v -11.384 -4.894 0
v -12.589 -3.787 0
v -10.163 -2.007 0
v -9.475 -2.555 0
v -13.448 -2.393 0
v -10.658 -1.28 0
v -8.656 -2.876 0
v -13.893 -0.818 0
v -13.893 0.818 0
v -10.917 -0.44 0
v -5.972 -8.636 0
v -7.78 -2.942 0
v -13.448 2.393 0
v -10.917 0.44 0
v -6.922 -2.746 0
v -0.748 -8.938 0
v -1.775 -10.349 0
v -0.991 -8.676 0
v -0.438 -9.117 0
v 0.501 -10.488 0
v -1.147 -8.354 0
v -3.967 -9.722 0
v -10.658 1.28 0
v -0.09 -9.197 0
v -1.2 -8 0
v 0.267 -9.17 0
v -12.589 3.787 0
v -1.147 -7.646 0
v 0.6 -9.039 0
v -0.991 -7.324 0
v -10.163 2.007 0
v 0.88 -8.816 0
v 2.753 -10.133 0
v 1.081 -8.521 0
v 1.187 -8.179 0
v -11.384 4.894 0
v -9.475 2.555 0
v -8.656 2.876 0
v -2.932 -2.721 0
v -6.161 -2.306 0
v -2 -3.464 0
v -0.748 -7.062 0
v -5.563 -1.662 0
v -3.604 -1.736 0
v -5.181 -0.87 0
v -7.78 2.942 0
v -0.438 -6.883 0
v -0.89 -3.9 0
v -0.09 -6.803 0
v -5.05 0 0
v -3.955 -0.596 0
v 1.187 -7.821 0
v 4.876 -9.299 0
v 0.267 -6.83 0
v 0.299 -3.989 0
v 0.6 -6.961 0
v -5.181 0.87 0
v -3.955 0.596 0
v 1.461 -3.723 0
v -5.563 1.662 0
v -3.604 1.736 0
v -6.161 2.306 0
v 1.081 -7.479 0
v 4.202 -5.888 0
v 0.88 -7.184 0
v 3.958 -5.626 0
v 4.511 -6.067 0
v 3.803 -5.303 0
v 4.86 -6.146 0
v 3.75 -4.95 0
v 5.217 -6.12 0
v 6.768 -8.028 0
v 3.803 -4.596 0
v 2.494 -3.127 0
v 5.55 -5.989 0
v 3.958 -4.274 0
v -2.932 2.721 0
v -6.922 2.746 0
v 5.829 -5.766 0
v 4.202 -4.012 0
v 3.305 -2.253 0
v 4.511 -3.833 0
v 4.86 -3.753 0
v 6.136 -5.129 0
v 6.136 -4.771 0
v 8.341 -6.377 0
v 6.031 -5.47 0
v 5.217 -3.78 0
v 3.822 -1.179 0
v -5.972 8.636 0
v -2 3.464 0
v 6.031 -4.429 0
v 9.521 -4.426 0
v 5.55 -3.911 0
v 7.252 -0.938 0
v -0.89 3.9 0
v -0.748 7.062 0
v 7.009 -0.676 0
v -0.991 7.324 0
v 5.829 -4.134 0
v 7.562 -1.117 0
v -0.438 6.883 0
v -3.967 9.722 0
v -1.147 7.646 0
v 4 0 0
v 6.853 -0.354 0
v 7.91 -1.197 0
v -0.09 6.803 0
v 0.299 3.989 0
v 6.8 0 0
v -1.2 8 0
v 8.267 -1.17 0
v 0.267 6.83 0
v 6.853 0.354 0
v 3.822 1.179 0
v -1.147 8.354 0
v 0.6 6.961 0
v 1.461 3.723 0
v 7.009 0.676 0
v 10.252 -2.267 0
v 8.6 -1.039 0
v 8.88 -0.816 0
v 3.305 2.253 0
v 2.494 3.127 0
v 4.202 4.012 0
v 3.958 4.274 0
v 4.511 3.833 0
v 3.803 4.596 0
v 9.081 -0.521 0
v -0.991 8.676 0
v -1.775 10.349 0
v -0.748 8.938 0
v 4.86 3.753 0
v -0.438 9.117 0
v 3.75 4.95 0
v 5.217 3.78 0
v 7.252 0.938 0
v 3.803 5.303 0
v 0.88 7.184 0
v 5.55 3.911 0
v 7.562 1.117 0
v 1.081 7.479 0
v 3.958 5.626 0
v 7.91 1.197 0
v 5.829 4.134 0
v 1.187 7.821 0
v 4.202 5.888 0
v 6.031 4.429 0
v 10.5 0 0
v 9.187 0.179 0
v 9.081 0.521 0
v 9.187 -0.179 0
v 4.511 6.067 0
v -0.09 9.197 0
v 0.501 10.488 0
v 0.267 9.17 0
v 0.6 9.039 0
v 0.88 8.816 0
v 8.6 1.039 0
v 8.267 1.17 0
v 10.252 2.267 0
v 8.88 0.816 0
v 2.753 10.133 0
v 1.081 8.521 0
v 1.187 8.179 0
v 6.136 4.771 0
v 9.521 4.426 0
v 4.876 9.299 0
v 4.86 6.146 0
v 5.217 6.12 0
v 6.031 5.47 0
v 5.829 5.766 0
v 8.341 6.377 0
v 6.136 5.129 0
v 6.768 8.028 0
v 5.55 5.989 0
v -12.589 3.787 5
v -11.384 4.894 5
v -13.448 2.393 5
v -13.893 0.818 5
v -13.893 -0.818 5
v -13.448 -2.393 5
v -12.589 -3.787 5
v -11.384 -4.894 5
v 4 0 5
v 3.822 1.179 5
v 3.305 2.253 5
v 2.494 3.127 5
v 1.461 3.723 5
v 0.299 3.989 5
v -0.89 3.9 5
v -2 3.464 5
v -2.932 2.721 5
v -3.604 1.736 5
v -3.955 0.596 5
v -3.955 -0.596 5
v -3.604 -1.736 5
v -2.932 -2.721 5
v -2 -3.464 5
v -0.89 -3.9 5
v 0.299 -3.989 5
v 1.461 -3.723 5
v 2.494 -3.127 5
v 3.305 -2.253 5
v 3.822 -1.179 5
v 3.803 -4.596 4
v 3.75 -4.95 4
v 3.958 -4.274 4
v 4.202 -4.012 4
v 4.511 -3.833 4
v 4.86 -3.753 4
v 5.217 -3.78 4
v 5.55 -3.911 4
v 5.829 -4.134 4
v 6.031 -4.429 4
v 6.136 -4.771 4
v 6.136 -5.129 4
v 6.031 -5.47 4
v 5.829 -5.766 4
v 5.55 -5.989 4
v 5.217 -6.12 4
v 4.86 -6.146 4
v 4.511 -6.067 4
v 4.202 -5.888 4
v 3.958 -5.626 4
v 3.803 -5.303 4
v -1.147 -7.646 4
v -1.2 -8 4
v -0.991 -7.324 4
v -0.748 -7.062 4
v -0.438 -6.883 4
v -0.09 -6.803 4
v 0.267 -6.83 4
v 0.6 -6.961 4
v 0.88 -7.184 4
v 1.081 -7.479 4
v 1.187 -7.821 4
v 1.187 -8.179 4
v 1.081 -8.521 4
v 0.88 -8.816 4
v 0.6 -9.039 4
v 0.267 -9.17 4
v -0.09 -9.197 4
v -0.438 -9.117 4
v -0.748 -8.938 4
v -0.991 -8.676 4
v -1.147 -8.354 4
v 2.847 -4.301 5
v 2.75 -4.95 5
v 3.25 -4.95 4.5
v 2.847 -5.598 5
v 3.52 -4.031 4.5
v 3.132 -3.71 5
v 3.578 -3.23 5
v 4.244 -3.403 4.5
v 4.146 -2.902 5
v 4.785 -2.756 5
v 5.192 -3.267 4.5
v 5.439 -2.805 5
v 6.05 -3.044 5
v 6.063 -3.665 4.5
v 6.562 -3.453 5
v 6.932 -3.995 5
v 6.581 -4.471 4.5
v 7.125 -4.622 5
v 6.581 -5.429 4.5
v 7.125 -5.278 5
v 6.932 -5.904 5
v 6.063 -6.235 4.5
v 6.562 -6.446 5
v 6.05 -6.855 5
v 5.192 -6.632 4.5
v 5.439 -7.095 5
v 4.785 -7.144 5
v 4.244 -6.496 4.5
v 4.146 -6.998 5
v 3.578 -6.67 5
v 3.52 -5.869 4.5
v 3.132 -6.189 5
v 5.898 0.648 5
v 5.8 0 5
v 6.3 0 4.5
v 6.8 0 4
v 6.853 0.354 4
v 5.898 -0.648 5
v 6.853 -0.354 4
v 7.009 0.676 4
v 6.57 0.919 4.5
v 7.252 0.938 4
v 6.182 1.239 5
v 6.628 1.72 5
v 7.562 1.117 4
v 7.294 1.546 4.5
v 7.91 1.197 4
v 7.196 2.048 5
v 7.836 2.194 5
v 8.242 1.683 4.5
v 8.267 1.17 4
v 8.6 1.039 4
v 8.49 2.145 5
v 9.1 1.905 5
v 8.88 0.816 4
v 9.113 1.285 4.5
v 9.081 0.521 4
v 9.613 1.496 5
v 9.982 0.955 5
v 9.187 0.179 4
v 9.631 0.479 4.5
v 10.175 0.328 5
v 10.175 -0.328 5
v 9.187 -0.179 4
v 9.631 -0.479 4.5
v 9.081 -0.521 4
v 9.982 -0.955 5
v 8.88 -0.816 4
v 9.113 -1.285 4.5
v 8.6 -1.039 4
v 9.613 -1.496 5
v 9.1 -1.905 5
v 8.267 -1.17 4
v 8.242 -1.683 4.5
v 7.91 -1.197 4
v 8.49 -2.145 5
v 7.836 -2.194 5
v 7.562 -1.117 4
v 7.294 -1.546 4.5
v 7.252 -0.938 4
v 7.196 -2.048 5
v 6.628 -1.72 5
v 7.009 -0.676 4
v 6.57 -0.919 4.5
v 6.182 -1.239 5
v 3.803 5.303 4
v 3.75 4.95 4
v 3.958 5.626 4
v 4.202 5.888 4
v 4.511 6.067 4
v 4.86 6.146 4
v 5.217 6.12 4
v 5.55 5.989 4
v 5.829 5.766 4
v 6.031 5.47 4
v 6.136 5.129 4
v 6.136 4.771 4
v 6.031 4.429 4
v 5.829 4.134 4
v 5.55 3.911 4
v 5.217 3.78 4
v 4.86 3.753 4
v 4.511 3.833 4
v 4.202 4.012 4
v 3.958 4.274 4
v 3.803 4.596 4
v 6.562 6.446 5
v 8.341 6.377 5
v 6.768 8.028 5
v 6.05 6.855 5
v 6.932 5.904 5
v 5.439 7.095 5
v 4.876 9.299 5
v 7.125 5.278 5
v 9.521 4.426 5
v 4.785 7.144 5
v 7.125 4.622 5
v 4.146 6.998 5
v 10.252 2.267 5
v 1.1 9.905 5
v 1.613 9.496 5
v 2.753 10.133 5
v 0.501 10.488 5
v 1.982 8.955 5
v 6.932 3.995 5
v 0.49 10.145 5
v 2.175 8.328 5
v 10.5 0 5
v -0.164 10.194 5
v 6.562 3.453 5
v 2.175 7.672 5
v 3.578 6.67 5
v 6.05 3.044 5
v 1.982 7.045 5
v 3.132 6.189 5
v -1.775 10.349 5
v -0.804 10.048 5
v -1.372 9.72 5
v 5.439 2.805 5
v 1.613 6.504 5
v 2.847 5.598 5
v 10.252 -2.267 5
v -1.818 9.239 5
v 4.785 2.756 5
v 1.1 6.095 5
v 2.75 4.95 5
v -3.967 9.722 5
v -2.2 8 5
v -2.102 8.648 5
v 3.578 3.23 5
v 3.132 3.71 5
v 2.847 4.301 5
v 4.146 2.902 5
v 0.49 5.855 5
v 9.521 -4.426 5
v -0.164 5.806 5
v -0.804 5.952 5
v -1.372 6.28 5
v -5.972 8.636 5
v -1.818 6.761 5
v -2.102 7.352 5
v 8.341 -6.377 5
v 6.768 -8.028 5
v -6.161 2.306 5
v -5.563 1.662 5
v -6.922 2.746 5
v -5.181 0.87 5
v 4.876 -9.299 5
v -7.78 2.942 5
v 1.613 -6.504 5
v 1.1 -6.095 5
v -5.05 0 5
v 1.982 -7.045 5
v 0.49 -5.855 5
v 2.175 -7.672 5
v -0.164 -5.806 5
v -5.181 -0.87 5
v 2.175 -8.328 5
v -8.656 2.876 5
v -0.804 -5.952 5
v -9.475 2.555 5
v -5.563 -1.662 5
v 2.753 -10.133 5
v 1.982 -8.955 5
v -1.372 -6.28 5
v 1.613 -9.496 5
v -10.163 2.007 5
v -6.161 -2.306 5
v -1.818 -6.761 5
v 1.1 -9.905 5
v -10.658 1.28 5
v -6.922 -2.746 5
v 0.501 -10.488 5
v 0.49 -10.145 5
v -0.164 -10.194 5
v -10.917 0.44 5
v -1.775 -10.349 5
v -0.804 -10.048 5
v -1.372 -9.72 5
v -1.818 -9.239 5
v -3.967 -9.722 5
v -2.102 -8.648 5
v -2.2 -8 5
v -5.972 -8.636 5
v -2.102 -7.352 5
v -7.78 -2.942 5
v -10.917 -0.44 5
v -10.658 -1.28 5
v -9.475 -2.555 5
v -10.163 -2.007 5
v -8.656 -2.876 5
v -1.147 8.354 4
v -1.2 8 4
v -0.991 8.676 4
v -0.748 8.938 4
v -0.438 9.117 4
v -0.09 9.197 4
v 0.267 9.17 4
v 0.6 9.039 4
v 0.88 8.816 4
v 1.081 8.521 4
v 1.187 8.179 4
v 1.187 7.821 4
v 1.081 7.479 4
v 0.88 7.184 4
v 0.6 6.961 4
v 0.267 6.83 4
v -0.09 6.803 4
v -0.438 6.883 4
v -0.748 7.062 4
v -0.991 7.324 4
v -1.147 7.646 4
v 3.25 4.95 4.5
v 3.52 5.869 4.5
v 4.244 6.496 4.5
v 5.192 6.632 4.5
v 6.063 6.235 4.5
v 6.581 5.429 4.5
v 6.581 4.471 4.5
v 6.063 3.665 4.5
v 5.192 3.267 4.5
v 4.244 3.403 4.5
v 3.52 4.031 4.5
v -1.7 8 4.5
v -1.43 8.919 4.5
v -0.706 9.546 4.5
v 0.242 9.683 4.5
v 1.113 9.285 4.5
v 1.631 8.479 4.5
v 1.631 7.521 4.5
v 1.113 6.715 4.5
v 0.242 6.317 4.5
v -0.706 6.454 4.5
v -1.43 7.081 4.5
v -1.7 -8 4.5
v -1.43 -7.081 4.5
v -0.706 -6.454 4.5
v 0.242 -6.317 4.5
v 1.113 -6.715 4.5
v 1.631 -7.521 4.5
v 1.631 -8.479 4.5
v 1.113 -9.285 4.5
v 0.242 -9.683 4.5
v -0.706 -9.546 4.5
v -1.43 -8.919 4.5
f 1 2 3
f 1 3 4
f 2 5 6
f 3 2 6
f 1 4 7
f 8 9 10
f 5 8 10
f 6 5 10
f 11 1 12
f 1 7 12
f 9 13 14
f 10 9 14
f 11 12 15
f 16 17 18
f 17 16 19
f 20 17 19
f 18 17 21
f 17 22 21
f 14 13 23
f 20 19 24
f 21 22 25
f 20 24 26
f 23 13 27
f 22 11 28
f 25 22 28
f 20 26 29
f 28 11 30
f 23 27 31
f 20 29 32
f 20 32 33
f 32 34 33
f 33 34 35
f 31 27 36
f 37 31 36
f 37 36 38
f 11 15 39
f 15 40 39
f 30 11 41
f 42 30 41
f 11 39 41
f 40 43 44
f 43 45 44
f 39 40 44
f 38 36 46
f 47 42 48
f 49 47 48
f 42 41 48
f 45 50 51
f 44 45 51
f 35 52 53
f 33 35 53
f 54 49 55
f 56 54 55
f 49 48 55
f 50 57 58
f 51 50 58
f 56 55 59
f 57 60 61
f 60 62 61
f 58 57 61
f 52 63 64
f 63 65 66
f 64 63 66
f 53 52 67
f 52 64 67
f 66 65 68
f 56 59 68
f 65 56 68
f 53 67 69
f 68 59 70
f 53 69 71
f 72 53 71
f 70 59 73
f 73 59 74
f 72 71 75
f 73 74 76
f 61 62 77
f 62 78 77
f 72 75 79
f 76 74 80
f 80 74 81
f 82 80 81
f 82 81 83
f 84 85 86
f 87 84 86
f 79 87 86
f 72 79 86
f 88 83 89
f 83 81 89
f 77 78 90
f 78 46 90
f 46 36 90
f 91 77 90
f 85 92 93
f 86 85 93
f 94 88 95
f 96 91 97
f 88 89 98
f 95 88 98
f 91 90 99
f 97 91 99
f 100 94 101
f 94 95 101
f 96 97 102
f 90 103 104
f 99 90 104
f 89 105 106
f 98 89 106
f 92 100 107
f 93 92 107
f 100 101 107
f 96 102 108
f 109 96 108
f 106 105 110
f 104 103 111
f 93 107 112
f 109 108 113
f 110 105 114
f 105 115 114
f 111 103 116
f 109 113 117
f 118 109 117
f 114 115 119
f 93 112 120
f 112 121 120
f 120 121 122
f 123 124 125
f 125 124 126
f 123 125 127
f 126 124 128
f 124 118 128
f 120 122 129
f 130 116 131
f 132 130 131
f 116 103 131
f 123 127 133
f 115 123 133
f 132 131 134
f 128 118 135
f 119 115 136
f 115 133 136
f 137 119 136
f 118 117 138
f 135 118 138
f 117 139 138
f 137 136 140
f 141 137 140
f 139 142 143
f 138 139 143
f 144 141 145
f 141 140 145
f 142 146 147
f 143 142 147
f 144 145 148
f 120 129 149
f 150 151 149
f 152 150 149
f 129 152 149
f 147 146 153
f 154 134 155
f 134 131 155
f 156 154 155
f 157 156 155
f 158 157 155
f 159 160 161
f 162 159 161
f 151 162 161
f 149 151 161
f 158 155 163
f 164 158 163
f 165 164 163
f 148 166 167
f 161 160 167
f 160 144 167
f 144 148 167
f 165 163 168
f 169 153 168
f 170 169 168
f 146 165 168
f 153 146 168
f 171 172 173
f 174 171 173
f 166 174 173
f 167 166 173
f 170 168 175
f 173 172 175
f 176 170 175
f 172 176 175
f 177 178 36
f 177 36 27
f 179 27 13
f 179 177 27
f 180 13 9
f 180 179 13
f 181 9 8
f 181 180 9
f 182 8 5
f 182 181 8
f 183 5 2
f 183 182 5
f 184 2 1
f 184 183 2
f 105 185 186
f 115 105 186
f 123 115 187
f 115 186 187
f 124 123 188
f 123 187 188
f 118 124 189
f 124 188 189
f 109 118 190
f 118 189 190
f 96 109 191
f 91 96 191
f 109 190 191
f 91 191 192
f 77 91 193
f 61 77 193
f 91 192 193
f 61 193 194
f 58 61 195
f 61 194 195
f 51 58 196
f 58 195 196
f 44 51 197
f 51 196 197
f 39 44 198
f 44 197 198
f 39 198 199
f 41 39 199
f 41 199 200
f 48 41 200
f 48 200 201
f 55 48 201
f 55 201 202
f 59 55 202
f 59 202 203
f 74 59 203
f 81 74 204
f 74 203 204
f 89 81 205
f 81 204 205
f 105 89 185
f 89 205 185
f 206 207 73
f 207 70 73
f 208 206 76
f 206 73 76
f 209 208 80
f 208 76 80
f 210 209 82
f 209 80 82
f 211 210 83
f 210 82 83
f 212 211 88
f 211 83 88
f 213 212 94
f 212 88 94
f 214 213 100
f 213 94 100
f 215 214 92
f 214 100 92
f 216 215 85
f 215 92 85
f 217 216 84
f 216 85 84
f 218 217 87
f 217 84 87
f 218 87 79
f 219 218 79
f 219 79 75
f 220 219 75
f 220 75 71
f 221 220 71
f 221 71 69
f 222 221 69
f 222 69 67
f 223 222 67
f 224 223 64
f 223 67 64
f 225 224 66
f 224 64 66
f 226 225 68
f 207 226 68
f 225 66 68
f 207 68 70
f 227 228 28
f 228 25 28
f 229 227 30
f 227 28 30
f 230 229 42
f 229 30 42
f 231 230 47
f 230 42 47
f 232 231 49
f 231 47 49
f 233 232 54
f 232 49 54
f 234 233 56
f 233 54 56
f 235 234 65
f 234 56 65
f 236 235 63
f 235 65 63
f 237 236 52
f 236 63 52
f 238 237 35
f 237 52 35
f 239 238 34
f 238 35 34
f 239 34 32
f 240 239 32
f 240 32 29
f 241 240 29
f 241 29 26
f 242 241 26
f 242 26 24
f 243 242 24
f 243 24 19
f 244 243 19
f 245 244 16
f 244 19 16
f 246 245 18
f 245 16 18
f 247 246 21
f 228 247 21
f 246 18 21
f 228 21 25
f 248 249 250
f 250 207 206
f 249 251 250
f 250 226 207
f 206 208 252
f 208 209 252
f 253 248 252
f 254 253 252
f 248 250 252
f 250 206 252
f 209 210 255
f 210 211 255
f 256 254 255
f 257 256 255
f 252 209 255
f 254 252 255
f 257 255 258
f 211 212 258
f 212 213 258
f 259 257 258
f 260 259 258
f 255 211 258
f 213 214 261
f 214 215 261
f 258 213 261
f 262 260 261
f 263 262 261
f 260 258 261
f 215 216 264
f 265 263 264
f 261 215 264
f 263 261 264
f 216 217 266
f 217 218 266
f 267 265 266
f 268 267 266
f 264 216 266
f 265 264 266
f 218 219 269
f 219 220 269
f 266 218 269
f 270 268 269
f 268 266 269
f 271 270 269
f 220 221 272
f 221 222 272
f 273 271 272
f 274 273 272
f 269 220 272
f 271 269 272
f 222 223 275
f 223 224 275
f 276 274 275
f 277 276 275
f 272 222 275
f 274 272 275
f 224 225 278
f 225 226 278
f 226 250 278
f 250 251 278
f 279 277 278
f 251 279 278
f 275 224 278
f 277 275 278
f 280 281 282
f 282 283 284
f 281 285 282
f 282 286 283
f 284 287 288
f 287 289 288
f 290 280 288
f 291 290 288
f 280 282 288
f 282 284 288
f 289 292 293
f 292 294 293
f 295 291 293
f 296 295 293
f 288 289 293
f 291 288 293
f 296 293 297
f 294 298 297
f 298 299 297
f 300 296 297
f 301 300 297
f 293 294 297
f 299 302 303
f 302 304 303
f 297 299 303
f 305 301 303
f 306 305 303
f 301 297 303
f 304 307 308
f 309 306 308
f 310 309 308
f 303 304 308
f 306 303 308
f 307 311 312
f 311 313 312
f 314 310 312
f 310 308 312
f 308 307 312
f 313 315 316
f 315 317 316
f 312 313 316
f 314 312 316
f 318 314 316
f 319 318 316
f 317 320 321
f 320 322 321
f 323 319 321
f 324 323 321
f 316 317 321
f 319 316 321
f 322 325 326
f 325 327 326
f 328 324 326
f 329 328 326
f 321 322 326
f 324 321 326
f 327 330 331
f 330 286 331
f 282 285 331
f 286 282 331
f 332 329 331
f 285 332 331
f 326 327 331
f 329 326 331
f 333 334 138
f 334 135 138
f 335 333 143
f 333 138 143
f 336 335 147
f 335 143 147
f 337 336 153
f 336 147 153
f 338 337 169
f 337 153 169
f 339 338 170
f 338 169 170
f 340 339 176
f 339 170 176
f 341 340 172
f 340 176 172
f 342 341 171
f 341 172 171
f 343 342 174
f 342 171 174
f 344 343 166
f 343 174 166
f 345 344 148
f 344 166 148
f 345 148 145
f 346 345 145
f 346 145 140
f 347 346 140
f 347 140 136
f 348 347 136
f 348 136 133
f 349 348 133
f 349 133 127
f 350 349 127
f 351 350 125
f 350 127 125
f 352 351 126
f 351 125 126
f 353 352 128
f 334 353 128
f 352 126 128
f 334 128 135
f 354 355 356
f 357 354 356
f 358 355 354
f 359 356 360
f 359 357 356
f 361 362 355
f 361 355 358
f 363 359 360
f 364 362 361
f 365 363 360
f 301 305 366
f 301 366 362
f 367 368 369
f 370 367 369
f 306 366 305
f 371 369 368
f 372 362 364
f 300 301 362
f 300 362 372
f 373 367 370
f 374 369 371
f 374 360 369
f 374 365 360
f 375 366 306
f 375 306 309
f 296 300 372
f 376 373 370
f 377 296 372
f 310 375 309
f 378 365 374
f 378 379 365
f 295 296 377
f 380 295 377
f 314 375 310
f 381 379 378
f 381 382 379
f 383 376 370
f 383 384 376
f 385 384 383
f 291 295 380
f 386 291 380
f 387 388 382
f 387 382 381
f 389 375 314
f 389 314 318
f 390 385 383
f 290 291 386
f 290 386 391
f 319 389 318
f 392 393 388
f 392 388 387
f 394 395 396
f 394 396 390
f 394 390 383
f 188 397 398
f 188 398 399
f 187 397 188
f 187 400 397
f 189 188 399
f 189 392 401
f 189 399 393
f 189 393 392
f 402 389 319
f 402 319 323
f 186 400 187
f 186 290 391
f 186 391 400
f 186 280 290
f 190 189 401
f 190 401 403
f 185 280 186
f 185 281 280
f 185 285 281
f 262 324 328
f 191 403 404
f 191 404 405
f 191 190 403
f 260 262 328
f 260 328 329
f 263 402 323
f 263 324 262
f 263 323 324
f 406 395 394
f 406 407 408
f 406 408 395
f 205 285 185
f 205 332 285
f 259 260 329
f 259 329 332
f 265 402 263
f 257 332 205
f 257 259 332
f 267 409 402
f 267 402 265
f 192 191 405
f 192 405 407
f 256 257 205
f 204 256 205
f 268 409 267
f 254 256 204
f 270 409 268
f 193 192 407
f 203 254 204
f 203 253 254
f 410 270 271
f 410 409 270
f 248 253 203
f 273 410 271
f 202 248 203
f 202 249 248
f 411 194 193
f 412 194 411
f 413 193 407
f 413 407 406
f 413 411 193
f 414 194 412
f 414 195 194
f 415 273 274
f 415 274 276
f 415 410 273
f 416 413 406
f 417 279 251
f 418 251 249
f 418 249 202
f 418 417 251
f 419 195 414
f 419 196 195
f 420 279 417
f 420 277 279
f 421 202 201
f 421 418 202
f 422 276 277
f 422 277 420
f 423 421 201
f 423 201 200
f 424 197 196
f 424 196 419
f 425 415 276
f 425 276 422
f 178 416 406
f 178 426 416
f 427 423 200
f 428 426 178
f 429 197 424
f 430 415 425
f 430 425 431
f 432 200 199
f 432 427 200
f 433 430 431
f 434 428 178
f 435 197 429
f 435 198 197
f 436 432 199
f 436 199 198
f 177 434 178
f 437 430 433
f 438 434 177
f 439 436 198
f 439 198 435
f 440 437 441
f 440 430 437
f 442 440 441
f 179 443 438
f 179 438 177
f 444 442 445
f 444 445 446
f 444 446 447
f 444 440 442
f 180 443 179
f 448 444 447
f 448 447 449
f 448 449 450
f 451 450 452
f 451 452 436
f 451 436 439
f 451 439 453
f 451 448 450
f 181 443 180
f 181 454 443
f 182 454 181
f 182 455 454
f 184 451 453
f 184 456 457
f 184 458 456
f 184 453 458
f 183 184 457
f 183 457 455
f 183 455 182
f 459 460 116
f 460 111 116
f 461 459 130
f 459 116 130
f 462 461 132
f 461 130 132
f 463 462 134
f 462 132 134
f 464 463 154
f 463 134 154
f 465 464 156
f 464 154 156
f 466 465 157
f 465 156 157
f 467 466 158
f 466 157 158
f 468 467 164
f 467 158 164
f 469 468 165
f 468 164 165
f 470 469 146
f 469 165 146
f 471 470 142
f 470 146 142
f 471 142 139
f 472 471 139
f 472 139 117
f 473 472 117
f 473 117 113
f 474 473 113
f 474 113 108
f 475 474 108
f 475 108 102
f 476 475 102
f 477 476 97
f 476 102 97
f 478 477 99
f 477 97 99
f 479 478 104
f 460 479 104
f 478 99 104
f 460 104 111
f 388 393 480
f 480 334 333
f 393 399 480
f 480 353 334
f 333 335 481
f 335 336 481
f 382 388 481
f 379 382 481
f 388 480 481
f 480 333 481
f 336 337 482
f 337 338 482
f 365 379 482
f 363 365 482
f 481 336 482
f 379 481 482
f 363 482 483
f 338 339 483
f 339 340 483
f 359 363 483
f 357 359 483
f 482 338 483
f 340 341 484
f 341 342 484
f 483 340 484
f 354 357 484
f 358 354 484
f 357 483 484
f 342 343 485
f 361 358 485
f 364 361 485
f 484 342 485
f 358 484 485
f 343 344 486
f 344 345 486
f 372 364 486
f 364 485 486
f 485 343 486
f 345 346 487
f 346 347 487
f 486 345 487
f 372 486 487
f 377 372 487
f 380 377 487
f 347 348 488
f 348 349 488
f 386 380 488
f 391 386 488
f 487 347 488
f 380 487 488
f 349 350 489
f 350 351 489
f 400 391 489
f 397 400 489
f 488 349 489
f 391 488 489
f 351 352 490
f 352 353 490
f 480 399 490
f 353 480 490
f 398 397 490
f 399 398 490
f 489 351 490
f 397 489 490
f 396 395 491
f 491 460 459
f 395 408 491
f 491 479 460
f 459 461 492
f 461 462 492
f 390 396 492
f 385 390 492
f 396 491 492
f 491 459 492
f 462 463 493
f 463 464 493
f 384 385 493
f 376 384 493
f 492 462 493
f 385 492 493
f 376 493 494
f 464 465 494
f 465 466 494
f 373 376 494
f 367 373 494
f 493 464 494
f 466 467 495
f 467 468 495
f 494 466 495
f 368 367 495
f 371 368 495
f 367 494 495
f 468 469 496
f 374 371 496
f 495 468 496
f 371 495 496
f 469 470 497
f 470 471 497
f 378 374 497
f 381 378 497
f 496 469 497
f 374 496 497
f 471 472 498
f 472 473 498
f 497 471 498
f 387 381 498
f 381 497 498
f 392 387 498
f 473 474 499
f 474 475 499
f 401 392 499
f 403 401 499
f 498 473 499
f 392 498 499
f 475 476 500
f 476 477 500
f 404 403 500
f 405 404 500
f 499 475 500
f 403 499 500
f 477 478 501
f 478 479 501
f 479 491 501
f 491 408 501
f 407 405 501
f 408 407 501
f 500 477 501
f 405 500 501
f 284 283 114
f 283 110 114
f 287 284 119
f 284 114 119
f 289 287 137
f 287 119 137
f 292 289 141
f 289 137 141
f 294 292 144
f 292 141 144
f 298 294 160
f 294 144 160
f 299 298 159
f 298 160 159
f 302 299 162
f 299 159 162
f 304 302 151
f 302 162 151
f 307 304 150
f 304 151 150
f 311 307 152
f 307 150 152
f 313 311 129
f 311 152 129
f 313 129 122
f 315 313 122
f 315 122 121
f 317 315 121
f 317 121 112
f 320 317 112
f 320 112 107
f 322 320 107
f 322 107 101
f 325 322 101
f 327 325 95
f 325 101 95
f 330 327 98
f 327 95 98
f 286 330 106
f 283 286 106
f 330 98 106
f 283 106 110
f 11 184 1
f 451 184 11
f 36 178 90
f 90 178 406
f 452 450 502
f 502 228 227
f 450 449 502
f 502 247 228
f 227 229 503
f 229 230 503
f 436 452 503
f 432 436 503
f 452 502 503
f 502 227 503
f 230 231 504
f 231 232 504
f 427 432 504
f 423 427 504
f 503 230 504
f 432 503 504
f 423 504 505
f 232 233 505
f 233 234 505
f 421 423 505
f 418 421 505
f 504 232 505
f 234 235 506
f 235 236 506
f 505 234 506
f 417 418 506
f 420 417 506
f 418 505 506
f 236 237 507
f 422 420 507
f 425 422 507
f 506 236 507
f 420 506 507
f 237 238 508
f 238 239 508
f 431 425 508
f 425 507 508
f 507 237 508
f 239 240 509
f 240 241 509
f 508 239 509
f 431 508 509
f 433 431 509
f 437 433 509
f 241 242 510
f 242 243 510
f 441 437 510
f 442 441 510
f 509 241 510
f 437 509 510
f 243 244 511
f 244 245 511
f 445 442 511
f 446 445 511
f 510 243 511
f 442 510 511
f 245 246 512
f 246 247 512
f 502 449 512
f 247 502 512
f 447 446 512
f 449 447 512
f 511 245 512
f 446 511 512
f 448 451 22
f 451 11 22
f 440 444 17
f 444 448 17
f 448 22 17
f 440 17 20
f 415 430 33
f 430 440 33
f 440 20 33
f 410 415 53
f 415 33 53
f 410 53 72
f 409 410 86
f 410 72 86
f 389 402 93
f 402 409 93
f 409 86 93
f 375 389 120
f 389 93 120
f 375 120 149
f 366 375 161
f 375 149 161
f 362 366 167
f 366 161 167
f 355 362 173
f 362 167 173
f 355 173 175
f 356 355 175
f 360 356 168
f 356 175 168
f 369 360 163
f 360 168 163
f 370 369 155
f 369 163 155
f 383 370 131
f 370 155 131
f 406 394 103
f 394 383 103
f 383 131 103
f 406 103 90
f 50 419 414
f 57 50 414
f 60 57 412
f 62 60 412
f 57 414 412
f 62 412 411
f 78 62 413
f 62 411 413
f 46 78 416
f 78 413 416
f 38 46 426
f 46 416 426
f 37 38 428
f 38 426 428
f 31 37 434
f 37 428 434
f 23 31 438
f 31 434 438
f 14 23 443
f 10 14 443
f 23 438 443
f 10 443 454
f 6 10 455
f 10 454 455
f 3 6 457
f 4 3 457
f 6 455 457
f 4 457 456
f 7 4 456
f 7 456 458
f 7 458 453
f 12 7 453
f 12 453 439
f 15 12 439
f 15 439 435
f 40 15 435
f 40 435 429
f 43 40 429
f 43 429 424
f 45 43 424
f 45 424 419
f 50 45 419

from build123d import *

# Parameters (mm, degrees)
SKETCH1_R                                           = 10.5
SKETCH1_R_2                                         = 0.8
BOSS_EXTRUDE1_DEPTH                                 = 5
SKETCH2_R                                           = 5.95
SKETCH2_R_2                                         = 2.95
BOSS_EXTRUDE2_DEPTH                                 = 5
CSK_FOR_M2_COUNTERSUNK_FLAT_HEAD_SCREW1_D           = 2.4
CSK_FOR_M2_COUNTERSUNK_FLAT_HEAD_SCREW1_CSINK_D     = 4.4
CSK_FOR_M2_COUNTERSUNK_FLAT_HEAD_SCREW1_CSINK_ANGLE = 90
SKETCH5_R                                           = 2.95
CUT_EXTRUDE1_DEPTH                                  = 5
SKETCH6_R                                           = 4
CUT_EXTRUDE2_DEPTH                                  = 5
BOSS_EXTRUDE3_DEPTH                                 = 5
SKETCH8_R                                           = 0.8
BOSS_EXTRUDE4_DEPTH                                 = 5


with BuildPart() as part:
    # Sketch1 → Boss-Extrude1 (new body)
    with BuildSketch(Plane.XY):
        Circle(SKETCH1_R)
        with Locations((-4.949747468, 4.949747468)):
            Circle(SKETCH1_R_2, mode=Mode.SUBTRACT)
        with Locations((0, 8)):
            Circle(SKETCH1_R_2, mode=Mode.SUBTRACT)
        with Locations((4.949747468, 4.949747468)):
            Circle(SKETCH1_R_2, mode=Mode.SUBTRACT)
        with Locations((8, 0)):
            Circle(SKETCH1_R_2, mode=Mode.SUBTRACT)
        with Locations((4.949747468, -4.949747468)):
            Circle(SKETCH1_R_2, mode=Mode.SUBTRACT)
        with Locations((0, -8)):
            Circle(SKETCH1_R_2, mode=Mode.SUBTRACT)
        with Locations((-4.949747468, -4.949747468)):
            Circle(SKETCH1_R_2, mode=Mode.SUBTRACT)
        with Locations((-8, 0)):
            Circle(SKETCH1_R_2, mode=Mode.SUBTRACT)
    extrude(amount=BOSS_EXTRUDE1_DEPTH)

    # Sketch2 → Boss-Extrude2 (add)
    with BuildSketch(Plane.XY.offset(5)):
        with Locations((-8, 0)):
            Circle(SKETCH2_R)
        with Locations((-8, 0)):
            Circle(SKETCH2_R_2, mode=Mode.SUBTRACT)
    extrude(amount=-BOSS_EXTRUDE2_DEPTH)

    # CSK for M2 Countersunk Flat Head Screw1 (through all)
    with Locations(Plane.XY.offset(5)):
        with Locations((4.949747468, 4.949747468), (0, 8), (0, -8), (8, 0), (4.949747468, -4.949747468)):
            CounterSinkHole(CSK_FOR_M2_COUNTERSUNK_FLAT_HEAD_SCREW1_D / 2, CSK_FOR_M2_COUNTERSUNK_FLAT_HEAD_SCREW1_CSINK_D / 2, counter_sink_angle=CSK_FOR_M2_COUNTERSUNK_FLAT_HEAD_SCREW1_CSINK_ANGLE)

    # Sketch5 → Cut-Extrude1 (cut)
    with BuildSketch(Plane.XY.offset(5)):
        with Locations((-8, 0)):
            Circle(SKETCH5_R)
    extrude(amount=-CUT_EXTRUDE1_DEPTH, mode=Mode.SUBTRACT)

    # Sketch6 → Cut-Extrude2 (cut)
    with BuildSketch(Plane.XY.offset(5)):
        Circle(SKETCH6_R)
    extrude(amount=-CUT_EXTRUDE2_DEPTH, mode=Mode.SUBTRACT)

    # Sketch7 → Boss-Extrude3 (add)
    with BuildSketch(Plane.XY.offset(5)):
        Polygon((-11.3840625, 4.893937167), (-5.971875, 8.636359707), (-6.233143588, 4.202369658), align=None)
    boss_extrude3 = extrude(amount=-BOSS_EXTRUDE3_DEPTH)

    # Mirror1: Boss-Extrude3 across plane
    add(boss_extrude3.mirror(Plane.ZX))

    # Sketch8 → Boss-Extrude4 (add)
    with BuildSketch(Plane.XY.offset(5)):
        with Locations((-4.949747468, 4.949747468)):
            Circle(SKETCH8_R)
        with Locations((-4.949747468, -4.949747468)):
            Circle(SKETCH8_R)
    extrude(amount=-BOSS_EXTRUDE4_DEPTH)


solid = part.part
